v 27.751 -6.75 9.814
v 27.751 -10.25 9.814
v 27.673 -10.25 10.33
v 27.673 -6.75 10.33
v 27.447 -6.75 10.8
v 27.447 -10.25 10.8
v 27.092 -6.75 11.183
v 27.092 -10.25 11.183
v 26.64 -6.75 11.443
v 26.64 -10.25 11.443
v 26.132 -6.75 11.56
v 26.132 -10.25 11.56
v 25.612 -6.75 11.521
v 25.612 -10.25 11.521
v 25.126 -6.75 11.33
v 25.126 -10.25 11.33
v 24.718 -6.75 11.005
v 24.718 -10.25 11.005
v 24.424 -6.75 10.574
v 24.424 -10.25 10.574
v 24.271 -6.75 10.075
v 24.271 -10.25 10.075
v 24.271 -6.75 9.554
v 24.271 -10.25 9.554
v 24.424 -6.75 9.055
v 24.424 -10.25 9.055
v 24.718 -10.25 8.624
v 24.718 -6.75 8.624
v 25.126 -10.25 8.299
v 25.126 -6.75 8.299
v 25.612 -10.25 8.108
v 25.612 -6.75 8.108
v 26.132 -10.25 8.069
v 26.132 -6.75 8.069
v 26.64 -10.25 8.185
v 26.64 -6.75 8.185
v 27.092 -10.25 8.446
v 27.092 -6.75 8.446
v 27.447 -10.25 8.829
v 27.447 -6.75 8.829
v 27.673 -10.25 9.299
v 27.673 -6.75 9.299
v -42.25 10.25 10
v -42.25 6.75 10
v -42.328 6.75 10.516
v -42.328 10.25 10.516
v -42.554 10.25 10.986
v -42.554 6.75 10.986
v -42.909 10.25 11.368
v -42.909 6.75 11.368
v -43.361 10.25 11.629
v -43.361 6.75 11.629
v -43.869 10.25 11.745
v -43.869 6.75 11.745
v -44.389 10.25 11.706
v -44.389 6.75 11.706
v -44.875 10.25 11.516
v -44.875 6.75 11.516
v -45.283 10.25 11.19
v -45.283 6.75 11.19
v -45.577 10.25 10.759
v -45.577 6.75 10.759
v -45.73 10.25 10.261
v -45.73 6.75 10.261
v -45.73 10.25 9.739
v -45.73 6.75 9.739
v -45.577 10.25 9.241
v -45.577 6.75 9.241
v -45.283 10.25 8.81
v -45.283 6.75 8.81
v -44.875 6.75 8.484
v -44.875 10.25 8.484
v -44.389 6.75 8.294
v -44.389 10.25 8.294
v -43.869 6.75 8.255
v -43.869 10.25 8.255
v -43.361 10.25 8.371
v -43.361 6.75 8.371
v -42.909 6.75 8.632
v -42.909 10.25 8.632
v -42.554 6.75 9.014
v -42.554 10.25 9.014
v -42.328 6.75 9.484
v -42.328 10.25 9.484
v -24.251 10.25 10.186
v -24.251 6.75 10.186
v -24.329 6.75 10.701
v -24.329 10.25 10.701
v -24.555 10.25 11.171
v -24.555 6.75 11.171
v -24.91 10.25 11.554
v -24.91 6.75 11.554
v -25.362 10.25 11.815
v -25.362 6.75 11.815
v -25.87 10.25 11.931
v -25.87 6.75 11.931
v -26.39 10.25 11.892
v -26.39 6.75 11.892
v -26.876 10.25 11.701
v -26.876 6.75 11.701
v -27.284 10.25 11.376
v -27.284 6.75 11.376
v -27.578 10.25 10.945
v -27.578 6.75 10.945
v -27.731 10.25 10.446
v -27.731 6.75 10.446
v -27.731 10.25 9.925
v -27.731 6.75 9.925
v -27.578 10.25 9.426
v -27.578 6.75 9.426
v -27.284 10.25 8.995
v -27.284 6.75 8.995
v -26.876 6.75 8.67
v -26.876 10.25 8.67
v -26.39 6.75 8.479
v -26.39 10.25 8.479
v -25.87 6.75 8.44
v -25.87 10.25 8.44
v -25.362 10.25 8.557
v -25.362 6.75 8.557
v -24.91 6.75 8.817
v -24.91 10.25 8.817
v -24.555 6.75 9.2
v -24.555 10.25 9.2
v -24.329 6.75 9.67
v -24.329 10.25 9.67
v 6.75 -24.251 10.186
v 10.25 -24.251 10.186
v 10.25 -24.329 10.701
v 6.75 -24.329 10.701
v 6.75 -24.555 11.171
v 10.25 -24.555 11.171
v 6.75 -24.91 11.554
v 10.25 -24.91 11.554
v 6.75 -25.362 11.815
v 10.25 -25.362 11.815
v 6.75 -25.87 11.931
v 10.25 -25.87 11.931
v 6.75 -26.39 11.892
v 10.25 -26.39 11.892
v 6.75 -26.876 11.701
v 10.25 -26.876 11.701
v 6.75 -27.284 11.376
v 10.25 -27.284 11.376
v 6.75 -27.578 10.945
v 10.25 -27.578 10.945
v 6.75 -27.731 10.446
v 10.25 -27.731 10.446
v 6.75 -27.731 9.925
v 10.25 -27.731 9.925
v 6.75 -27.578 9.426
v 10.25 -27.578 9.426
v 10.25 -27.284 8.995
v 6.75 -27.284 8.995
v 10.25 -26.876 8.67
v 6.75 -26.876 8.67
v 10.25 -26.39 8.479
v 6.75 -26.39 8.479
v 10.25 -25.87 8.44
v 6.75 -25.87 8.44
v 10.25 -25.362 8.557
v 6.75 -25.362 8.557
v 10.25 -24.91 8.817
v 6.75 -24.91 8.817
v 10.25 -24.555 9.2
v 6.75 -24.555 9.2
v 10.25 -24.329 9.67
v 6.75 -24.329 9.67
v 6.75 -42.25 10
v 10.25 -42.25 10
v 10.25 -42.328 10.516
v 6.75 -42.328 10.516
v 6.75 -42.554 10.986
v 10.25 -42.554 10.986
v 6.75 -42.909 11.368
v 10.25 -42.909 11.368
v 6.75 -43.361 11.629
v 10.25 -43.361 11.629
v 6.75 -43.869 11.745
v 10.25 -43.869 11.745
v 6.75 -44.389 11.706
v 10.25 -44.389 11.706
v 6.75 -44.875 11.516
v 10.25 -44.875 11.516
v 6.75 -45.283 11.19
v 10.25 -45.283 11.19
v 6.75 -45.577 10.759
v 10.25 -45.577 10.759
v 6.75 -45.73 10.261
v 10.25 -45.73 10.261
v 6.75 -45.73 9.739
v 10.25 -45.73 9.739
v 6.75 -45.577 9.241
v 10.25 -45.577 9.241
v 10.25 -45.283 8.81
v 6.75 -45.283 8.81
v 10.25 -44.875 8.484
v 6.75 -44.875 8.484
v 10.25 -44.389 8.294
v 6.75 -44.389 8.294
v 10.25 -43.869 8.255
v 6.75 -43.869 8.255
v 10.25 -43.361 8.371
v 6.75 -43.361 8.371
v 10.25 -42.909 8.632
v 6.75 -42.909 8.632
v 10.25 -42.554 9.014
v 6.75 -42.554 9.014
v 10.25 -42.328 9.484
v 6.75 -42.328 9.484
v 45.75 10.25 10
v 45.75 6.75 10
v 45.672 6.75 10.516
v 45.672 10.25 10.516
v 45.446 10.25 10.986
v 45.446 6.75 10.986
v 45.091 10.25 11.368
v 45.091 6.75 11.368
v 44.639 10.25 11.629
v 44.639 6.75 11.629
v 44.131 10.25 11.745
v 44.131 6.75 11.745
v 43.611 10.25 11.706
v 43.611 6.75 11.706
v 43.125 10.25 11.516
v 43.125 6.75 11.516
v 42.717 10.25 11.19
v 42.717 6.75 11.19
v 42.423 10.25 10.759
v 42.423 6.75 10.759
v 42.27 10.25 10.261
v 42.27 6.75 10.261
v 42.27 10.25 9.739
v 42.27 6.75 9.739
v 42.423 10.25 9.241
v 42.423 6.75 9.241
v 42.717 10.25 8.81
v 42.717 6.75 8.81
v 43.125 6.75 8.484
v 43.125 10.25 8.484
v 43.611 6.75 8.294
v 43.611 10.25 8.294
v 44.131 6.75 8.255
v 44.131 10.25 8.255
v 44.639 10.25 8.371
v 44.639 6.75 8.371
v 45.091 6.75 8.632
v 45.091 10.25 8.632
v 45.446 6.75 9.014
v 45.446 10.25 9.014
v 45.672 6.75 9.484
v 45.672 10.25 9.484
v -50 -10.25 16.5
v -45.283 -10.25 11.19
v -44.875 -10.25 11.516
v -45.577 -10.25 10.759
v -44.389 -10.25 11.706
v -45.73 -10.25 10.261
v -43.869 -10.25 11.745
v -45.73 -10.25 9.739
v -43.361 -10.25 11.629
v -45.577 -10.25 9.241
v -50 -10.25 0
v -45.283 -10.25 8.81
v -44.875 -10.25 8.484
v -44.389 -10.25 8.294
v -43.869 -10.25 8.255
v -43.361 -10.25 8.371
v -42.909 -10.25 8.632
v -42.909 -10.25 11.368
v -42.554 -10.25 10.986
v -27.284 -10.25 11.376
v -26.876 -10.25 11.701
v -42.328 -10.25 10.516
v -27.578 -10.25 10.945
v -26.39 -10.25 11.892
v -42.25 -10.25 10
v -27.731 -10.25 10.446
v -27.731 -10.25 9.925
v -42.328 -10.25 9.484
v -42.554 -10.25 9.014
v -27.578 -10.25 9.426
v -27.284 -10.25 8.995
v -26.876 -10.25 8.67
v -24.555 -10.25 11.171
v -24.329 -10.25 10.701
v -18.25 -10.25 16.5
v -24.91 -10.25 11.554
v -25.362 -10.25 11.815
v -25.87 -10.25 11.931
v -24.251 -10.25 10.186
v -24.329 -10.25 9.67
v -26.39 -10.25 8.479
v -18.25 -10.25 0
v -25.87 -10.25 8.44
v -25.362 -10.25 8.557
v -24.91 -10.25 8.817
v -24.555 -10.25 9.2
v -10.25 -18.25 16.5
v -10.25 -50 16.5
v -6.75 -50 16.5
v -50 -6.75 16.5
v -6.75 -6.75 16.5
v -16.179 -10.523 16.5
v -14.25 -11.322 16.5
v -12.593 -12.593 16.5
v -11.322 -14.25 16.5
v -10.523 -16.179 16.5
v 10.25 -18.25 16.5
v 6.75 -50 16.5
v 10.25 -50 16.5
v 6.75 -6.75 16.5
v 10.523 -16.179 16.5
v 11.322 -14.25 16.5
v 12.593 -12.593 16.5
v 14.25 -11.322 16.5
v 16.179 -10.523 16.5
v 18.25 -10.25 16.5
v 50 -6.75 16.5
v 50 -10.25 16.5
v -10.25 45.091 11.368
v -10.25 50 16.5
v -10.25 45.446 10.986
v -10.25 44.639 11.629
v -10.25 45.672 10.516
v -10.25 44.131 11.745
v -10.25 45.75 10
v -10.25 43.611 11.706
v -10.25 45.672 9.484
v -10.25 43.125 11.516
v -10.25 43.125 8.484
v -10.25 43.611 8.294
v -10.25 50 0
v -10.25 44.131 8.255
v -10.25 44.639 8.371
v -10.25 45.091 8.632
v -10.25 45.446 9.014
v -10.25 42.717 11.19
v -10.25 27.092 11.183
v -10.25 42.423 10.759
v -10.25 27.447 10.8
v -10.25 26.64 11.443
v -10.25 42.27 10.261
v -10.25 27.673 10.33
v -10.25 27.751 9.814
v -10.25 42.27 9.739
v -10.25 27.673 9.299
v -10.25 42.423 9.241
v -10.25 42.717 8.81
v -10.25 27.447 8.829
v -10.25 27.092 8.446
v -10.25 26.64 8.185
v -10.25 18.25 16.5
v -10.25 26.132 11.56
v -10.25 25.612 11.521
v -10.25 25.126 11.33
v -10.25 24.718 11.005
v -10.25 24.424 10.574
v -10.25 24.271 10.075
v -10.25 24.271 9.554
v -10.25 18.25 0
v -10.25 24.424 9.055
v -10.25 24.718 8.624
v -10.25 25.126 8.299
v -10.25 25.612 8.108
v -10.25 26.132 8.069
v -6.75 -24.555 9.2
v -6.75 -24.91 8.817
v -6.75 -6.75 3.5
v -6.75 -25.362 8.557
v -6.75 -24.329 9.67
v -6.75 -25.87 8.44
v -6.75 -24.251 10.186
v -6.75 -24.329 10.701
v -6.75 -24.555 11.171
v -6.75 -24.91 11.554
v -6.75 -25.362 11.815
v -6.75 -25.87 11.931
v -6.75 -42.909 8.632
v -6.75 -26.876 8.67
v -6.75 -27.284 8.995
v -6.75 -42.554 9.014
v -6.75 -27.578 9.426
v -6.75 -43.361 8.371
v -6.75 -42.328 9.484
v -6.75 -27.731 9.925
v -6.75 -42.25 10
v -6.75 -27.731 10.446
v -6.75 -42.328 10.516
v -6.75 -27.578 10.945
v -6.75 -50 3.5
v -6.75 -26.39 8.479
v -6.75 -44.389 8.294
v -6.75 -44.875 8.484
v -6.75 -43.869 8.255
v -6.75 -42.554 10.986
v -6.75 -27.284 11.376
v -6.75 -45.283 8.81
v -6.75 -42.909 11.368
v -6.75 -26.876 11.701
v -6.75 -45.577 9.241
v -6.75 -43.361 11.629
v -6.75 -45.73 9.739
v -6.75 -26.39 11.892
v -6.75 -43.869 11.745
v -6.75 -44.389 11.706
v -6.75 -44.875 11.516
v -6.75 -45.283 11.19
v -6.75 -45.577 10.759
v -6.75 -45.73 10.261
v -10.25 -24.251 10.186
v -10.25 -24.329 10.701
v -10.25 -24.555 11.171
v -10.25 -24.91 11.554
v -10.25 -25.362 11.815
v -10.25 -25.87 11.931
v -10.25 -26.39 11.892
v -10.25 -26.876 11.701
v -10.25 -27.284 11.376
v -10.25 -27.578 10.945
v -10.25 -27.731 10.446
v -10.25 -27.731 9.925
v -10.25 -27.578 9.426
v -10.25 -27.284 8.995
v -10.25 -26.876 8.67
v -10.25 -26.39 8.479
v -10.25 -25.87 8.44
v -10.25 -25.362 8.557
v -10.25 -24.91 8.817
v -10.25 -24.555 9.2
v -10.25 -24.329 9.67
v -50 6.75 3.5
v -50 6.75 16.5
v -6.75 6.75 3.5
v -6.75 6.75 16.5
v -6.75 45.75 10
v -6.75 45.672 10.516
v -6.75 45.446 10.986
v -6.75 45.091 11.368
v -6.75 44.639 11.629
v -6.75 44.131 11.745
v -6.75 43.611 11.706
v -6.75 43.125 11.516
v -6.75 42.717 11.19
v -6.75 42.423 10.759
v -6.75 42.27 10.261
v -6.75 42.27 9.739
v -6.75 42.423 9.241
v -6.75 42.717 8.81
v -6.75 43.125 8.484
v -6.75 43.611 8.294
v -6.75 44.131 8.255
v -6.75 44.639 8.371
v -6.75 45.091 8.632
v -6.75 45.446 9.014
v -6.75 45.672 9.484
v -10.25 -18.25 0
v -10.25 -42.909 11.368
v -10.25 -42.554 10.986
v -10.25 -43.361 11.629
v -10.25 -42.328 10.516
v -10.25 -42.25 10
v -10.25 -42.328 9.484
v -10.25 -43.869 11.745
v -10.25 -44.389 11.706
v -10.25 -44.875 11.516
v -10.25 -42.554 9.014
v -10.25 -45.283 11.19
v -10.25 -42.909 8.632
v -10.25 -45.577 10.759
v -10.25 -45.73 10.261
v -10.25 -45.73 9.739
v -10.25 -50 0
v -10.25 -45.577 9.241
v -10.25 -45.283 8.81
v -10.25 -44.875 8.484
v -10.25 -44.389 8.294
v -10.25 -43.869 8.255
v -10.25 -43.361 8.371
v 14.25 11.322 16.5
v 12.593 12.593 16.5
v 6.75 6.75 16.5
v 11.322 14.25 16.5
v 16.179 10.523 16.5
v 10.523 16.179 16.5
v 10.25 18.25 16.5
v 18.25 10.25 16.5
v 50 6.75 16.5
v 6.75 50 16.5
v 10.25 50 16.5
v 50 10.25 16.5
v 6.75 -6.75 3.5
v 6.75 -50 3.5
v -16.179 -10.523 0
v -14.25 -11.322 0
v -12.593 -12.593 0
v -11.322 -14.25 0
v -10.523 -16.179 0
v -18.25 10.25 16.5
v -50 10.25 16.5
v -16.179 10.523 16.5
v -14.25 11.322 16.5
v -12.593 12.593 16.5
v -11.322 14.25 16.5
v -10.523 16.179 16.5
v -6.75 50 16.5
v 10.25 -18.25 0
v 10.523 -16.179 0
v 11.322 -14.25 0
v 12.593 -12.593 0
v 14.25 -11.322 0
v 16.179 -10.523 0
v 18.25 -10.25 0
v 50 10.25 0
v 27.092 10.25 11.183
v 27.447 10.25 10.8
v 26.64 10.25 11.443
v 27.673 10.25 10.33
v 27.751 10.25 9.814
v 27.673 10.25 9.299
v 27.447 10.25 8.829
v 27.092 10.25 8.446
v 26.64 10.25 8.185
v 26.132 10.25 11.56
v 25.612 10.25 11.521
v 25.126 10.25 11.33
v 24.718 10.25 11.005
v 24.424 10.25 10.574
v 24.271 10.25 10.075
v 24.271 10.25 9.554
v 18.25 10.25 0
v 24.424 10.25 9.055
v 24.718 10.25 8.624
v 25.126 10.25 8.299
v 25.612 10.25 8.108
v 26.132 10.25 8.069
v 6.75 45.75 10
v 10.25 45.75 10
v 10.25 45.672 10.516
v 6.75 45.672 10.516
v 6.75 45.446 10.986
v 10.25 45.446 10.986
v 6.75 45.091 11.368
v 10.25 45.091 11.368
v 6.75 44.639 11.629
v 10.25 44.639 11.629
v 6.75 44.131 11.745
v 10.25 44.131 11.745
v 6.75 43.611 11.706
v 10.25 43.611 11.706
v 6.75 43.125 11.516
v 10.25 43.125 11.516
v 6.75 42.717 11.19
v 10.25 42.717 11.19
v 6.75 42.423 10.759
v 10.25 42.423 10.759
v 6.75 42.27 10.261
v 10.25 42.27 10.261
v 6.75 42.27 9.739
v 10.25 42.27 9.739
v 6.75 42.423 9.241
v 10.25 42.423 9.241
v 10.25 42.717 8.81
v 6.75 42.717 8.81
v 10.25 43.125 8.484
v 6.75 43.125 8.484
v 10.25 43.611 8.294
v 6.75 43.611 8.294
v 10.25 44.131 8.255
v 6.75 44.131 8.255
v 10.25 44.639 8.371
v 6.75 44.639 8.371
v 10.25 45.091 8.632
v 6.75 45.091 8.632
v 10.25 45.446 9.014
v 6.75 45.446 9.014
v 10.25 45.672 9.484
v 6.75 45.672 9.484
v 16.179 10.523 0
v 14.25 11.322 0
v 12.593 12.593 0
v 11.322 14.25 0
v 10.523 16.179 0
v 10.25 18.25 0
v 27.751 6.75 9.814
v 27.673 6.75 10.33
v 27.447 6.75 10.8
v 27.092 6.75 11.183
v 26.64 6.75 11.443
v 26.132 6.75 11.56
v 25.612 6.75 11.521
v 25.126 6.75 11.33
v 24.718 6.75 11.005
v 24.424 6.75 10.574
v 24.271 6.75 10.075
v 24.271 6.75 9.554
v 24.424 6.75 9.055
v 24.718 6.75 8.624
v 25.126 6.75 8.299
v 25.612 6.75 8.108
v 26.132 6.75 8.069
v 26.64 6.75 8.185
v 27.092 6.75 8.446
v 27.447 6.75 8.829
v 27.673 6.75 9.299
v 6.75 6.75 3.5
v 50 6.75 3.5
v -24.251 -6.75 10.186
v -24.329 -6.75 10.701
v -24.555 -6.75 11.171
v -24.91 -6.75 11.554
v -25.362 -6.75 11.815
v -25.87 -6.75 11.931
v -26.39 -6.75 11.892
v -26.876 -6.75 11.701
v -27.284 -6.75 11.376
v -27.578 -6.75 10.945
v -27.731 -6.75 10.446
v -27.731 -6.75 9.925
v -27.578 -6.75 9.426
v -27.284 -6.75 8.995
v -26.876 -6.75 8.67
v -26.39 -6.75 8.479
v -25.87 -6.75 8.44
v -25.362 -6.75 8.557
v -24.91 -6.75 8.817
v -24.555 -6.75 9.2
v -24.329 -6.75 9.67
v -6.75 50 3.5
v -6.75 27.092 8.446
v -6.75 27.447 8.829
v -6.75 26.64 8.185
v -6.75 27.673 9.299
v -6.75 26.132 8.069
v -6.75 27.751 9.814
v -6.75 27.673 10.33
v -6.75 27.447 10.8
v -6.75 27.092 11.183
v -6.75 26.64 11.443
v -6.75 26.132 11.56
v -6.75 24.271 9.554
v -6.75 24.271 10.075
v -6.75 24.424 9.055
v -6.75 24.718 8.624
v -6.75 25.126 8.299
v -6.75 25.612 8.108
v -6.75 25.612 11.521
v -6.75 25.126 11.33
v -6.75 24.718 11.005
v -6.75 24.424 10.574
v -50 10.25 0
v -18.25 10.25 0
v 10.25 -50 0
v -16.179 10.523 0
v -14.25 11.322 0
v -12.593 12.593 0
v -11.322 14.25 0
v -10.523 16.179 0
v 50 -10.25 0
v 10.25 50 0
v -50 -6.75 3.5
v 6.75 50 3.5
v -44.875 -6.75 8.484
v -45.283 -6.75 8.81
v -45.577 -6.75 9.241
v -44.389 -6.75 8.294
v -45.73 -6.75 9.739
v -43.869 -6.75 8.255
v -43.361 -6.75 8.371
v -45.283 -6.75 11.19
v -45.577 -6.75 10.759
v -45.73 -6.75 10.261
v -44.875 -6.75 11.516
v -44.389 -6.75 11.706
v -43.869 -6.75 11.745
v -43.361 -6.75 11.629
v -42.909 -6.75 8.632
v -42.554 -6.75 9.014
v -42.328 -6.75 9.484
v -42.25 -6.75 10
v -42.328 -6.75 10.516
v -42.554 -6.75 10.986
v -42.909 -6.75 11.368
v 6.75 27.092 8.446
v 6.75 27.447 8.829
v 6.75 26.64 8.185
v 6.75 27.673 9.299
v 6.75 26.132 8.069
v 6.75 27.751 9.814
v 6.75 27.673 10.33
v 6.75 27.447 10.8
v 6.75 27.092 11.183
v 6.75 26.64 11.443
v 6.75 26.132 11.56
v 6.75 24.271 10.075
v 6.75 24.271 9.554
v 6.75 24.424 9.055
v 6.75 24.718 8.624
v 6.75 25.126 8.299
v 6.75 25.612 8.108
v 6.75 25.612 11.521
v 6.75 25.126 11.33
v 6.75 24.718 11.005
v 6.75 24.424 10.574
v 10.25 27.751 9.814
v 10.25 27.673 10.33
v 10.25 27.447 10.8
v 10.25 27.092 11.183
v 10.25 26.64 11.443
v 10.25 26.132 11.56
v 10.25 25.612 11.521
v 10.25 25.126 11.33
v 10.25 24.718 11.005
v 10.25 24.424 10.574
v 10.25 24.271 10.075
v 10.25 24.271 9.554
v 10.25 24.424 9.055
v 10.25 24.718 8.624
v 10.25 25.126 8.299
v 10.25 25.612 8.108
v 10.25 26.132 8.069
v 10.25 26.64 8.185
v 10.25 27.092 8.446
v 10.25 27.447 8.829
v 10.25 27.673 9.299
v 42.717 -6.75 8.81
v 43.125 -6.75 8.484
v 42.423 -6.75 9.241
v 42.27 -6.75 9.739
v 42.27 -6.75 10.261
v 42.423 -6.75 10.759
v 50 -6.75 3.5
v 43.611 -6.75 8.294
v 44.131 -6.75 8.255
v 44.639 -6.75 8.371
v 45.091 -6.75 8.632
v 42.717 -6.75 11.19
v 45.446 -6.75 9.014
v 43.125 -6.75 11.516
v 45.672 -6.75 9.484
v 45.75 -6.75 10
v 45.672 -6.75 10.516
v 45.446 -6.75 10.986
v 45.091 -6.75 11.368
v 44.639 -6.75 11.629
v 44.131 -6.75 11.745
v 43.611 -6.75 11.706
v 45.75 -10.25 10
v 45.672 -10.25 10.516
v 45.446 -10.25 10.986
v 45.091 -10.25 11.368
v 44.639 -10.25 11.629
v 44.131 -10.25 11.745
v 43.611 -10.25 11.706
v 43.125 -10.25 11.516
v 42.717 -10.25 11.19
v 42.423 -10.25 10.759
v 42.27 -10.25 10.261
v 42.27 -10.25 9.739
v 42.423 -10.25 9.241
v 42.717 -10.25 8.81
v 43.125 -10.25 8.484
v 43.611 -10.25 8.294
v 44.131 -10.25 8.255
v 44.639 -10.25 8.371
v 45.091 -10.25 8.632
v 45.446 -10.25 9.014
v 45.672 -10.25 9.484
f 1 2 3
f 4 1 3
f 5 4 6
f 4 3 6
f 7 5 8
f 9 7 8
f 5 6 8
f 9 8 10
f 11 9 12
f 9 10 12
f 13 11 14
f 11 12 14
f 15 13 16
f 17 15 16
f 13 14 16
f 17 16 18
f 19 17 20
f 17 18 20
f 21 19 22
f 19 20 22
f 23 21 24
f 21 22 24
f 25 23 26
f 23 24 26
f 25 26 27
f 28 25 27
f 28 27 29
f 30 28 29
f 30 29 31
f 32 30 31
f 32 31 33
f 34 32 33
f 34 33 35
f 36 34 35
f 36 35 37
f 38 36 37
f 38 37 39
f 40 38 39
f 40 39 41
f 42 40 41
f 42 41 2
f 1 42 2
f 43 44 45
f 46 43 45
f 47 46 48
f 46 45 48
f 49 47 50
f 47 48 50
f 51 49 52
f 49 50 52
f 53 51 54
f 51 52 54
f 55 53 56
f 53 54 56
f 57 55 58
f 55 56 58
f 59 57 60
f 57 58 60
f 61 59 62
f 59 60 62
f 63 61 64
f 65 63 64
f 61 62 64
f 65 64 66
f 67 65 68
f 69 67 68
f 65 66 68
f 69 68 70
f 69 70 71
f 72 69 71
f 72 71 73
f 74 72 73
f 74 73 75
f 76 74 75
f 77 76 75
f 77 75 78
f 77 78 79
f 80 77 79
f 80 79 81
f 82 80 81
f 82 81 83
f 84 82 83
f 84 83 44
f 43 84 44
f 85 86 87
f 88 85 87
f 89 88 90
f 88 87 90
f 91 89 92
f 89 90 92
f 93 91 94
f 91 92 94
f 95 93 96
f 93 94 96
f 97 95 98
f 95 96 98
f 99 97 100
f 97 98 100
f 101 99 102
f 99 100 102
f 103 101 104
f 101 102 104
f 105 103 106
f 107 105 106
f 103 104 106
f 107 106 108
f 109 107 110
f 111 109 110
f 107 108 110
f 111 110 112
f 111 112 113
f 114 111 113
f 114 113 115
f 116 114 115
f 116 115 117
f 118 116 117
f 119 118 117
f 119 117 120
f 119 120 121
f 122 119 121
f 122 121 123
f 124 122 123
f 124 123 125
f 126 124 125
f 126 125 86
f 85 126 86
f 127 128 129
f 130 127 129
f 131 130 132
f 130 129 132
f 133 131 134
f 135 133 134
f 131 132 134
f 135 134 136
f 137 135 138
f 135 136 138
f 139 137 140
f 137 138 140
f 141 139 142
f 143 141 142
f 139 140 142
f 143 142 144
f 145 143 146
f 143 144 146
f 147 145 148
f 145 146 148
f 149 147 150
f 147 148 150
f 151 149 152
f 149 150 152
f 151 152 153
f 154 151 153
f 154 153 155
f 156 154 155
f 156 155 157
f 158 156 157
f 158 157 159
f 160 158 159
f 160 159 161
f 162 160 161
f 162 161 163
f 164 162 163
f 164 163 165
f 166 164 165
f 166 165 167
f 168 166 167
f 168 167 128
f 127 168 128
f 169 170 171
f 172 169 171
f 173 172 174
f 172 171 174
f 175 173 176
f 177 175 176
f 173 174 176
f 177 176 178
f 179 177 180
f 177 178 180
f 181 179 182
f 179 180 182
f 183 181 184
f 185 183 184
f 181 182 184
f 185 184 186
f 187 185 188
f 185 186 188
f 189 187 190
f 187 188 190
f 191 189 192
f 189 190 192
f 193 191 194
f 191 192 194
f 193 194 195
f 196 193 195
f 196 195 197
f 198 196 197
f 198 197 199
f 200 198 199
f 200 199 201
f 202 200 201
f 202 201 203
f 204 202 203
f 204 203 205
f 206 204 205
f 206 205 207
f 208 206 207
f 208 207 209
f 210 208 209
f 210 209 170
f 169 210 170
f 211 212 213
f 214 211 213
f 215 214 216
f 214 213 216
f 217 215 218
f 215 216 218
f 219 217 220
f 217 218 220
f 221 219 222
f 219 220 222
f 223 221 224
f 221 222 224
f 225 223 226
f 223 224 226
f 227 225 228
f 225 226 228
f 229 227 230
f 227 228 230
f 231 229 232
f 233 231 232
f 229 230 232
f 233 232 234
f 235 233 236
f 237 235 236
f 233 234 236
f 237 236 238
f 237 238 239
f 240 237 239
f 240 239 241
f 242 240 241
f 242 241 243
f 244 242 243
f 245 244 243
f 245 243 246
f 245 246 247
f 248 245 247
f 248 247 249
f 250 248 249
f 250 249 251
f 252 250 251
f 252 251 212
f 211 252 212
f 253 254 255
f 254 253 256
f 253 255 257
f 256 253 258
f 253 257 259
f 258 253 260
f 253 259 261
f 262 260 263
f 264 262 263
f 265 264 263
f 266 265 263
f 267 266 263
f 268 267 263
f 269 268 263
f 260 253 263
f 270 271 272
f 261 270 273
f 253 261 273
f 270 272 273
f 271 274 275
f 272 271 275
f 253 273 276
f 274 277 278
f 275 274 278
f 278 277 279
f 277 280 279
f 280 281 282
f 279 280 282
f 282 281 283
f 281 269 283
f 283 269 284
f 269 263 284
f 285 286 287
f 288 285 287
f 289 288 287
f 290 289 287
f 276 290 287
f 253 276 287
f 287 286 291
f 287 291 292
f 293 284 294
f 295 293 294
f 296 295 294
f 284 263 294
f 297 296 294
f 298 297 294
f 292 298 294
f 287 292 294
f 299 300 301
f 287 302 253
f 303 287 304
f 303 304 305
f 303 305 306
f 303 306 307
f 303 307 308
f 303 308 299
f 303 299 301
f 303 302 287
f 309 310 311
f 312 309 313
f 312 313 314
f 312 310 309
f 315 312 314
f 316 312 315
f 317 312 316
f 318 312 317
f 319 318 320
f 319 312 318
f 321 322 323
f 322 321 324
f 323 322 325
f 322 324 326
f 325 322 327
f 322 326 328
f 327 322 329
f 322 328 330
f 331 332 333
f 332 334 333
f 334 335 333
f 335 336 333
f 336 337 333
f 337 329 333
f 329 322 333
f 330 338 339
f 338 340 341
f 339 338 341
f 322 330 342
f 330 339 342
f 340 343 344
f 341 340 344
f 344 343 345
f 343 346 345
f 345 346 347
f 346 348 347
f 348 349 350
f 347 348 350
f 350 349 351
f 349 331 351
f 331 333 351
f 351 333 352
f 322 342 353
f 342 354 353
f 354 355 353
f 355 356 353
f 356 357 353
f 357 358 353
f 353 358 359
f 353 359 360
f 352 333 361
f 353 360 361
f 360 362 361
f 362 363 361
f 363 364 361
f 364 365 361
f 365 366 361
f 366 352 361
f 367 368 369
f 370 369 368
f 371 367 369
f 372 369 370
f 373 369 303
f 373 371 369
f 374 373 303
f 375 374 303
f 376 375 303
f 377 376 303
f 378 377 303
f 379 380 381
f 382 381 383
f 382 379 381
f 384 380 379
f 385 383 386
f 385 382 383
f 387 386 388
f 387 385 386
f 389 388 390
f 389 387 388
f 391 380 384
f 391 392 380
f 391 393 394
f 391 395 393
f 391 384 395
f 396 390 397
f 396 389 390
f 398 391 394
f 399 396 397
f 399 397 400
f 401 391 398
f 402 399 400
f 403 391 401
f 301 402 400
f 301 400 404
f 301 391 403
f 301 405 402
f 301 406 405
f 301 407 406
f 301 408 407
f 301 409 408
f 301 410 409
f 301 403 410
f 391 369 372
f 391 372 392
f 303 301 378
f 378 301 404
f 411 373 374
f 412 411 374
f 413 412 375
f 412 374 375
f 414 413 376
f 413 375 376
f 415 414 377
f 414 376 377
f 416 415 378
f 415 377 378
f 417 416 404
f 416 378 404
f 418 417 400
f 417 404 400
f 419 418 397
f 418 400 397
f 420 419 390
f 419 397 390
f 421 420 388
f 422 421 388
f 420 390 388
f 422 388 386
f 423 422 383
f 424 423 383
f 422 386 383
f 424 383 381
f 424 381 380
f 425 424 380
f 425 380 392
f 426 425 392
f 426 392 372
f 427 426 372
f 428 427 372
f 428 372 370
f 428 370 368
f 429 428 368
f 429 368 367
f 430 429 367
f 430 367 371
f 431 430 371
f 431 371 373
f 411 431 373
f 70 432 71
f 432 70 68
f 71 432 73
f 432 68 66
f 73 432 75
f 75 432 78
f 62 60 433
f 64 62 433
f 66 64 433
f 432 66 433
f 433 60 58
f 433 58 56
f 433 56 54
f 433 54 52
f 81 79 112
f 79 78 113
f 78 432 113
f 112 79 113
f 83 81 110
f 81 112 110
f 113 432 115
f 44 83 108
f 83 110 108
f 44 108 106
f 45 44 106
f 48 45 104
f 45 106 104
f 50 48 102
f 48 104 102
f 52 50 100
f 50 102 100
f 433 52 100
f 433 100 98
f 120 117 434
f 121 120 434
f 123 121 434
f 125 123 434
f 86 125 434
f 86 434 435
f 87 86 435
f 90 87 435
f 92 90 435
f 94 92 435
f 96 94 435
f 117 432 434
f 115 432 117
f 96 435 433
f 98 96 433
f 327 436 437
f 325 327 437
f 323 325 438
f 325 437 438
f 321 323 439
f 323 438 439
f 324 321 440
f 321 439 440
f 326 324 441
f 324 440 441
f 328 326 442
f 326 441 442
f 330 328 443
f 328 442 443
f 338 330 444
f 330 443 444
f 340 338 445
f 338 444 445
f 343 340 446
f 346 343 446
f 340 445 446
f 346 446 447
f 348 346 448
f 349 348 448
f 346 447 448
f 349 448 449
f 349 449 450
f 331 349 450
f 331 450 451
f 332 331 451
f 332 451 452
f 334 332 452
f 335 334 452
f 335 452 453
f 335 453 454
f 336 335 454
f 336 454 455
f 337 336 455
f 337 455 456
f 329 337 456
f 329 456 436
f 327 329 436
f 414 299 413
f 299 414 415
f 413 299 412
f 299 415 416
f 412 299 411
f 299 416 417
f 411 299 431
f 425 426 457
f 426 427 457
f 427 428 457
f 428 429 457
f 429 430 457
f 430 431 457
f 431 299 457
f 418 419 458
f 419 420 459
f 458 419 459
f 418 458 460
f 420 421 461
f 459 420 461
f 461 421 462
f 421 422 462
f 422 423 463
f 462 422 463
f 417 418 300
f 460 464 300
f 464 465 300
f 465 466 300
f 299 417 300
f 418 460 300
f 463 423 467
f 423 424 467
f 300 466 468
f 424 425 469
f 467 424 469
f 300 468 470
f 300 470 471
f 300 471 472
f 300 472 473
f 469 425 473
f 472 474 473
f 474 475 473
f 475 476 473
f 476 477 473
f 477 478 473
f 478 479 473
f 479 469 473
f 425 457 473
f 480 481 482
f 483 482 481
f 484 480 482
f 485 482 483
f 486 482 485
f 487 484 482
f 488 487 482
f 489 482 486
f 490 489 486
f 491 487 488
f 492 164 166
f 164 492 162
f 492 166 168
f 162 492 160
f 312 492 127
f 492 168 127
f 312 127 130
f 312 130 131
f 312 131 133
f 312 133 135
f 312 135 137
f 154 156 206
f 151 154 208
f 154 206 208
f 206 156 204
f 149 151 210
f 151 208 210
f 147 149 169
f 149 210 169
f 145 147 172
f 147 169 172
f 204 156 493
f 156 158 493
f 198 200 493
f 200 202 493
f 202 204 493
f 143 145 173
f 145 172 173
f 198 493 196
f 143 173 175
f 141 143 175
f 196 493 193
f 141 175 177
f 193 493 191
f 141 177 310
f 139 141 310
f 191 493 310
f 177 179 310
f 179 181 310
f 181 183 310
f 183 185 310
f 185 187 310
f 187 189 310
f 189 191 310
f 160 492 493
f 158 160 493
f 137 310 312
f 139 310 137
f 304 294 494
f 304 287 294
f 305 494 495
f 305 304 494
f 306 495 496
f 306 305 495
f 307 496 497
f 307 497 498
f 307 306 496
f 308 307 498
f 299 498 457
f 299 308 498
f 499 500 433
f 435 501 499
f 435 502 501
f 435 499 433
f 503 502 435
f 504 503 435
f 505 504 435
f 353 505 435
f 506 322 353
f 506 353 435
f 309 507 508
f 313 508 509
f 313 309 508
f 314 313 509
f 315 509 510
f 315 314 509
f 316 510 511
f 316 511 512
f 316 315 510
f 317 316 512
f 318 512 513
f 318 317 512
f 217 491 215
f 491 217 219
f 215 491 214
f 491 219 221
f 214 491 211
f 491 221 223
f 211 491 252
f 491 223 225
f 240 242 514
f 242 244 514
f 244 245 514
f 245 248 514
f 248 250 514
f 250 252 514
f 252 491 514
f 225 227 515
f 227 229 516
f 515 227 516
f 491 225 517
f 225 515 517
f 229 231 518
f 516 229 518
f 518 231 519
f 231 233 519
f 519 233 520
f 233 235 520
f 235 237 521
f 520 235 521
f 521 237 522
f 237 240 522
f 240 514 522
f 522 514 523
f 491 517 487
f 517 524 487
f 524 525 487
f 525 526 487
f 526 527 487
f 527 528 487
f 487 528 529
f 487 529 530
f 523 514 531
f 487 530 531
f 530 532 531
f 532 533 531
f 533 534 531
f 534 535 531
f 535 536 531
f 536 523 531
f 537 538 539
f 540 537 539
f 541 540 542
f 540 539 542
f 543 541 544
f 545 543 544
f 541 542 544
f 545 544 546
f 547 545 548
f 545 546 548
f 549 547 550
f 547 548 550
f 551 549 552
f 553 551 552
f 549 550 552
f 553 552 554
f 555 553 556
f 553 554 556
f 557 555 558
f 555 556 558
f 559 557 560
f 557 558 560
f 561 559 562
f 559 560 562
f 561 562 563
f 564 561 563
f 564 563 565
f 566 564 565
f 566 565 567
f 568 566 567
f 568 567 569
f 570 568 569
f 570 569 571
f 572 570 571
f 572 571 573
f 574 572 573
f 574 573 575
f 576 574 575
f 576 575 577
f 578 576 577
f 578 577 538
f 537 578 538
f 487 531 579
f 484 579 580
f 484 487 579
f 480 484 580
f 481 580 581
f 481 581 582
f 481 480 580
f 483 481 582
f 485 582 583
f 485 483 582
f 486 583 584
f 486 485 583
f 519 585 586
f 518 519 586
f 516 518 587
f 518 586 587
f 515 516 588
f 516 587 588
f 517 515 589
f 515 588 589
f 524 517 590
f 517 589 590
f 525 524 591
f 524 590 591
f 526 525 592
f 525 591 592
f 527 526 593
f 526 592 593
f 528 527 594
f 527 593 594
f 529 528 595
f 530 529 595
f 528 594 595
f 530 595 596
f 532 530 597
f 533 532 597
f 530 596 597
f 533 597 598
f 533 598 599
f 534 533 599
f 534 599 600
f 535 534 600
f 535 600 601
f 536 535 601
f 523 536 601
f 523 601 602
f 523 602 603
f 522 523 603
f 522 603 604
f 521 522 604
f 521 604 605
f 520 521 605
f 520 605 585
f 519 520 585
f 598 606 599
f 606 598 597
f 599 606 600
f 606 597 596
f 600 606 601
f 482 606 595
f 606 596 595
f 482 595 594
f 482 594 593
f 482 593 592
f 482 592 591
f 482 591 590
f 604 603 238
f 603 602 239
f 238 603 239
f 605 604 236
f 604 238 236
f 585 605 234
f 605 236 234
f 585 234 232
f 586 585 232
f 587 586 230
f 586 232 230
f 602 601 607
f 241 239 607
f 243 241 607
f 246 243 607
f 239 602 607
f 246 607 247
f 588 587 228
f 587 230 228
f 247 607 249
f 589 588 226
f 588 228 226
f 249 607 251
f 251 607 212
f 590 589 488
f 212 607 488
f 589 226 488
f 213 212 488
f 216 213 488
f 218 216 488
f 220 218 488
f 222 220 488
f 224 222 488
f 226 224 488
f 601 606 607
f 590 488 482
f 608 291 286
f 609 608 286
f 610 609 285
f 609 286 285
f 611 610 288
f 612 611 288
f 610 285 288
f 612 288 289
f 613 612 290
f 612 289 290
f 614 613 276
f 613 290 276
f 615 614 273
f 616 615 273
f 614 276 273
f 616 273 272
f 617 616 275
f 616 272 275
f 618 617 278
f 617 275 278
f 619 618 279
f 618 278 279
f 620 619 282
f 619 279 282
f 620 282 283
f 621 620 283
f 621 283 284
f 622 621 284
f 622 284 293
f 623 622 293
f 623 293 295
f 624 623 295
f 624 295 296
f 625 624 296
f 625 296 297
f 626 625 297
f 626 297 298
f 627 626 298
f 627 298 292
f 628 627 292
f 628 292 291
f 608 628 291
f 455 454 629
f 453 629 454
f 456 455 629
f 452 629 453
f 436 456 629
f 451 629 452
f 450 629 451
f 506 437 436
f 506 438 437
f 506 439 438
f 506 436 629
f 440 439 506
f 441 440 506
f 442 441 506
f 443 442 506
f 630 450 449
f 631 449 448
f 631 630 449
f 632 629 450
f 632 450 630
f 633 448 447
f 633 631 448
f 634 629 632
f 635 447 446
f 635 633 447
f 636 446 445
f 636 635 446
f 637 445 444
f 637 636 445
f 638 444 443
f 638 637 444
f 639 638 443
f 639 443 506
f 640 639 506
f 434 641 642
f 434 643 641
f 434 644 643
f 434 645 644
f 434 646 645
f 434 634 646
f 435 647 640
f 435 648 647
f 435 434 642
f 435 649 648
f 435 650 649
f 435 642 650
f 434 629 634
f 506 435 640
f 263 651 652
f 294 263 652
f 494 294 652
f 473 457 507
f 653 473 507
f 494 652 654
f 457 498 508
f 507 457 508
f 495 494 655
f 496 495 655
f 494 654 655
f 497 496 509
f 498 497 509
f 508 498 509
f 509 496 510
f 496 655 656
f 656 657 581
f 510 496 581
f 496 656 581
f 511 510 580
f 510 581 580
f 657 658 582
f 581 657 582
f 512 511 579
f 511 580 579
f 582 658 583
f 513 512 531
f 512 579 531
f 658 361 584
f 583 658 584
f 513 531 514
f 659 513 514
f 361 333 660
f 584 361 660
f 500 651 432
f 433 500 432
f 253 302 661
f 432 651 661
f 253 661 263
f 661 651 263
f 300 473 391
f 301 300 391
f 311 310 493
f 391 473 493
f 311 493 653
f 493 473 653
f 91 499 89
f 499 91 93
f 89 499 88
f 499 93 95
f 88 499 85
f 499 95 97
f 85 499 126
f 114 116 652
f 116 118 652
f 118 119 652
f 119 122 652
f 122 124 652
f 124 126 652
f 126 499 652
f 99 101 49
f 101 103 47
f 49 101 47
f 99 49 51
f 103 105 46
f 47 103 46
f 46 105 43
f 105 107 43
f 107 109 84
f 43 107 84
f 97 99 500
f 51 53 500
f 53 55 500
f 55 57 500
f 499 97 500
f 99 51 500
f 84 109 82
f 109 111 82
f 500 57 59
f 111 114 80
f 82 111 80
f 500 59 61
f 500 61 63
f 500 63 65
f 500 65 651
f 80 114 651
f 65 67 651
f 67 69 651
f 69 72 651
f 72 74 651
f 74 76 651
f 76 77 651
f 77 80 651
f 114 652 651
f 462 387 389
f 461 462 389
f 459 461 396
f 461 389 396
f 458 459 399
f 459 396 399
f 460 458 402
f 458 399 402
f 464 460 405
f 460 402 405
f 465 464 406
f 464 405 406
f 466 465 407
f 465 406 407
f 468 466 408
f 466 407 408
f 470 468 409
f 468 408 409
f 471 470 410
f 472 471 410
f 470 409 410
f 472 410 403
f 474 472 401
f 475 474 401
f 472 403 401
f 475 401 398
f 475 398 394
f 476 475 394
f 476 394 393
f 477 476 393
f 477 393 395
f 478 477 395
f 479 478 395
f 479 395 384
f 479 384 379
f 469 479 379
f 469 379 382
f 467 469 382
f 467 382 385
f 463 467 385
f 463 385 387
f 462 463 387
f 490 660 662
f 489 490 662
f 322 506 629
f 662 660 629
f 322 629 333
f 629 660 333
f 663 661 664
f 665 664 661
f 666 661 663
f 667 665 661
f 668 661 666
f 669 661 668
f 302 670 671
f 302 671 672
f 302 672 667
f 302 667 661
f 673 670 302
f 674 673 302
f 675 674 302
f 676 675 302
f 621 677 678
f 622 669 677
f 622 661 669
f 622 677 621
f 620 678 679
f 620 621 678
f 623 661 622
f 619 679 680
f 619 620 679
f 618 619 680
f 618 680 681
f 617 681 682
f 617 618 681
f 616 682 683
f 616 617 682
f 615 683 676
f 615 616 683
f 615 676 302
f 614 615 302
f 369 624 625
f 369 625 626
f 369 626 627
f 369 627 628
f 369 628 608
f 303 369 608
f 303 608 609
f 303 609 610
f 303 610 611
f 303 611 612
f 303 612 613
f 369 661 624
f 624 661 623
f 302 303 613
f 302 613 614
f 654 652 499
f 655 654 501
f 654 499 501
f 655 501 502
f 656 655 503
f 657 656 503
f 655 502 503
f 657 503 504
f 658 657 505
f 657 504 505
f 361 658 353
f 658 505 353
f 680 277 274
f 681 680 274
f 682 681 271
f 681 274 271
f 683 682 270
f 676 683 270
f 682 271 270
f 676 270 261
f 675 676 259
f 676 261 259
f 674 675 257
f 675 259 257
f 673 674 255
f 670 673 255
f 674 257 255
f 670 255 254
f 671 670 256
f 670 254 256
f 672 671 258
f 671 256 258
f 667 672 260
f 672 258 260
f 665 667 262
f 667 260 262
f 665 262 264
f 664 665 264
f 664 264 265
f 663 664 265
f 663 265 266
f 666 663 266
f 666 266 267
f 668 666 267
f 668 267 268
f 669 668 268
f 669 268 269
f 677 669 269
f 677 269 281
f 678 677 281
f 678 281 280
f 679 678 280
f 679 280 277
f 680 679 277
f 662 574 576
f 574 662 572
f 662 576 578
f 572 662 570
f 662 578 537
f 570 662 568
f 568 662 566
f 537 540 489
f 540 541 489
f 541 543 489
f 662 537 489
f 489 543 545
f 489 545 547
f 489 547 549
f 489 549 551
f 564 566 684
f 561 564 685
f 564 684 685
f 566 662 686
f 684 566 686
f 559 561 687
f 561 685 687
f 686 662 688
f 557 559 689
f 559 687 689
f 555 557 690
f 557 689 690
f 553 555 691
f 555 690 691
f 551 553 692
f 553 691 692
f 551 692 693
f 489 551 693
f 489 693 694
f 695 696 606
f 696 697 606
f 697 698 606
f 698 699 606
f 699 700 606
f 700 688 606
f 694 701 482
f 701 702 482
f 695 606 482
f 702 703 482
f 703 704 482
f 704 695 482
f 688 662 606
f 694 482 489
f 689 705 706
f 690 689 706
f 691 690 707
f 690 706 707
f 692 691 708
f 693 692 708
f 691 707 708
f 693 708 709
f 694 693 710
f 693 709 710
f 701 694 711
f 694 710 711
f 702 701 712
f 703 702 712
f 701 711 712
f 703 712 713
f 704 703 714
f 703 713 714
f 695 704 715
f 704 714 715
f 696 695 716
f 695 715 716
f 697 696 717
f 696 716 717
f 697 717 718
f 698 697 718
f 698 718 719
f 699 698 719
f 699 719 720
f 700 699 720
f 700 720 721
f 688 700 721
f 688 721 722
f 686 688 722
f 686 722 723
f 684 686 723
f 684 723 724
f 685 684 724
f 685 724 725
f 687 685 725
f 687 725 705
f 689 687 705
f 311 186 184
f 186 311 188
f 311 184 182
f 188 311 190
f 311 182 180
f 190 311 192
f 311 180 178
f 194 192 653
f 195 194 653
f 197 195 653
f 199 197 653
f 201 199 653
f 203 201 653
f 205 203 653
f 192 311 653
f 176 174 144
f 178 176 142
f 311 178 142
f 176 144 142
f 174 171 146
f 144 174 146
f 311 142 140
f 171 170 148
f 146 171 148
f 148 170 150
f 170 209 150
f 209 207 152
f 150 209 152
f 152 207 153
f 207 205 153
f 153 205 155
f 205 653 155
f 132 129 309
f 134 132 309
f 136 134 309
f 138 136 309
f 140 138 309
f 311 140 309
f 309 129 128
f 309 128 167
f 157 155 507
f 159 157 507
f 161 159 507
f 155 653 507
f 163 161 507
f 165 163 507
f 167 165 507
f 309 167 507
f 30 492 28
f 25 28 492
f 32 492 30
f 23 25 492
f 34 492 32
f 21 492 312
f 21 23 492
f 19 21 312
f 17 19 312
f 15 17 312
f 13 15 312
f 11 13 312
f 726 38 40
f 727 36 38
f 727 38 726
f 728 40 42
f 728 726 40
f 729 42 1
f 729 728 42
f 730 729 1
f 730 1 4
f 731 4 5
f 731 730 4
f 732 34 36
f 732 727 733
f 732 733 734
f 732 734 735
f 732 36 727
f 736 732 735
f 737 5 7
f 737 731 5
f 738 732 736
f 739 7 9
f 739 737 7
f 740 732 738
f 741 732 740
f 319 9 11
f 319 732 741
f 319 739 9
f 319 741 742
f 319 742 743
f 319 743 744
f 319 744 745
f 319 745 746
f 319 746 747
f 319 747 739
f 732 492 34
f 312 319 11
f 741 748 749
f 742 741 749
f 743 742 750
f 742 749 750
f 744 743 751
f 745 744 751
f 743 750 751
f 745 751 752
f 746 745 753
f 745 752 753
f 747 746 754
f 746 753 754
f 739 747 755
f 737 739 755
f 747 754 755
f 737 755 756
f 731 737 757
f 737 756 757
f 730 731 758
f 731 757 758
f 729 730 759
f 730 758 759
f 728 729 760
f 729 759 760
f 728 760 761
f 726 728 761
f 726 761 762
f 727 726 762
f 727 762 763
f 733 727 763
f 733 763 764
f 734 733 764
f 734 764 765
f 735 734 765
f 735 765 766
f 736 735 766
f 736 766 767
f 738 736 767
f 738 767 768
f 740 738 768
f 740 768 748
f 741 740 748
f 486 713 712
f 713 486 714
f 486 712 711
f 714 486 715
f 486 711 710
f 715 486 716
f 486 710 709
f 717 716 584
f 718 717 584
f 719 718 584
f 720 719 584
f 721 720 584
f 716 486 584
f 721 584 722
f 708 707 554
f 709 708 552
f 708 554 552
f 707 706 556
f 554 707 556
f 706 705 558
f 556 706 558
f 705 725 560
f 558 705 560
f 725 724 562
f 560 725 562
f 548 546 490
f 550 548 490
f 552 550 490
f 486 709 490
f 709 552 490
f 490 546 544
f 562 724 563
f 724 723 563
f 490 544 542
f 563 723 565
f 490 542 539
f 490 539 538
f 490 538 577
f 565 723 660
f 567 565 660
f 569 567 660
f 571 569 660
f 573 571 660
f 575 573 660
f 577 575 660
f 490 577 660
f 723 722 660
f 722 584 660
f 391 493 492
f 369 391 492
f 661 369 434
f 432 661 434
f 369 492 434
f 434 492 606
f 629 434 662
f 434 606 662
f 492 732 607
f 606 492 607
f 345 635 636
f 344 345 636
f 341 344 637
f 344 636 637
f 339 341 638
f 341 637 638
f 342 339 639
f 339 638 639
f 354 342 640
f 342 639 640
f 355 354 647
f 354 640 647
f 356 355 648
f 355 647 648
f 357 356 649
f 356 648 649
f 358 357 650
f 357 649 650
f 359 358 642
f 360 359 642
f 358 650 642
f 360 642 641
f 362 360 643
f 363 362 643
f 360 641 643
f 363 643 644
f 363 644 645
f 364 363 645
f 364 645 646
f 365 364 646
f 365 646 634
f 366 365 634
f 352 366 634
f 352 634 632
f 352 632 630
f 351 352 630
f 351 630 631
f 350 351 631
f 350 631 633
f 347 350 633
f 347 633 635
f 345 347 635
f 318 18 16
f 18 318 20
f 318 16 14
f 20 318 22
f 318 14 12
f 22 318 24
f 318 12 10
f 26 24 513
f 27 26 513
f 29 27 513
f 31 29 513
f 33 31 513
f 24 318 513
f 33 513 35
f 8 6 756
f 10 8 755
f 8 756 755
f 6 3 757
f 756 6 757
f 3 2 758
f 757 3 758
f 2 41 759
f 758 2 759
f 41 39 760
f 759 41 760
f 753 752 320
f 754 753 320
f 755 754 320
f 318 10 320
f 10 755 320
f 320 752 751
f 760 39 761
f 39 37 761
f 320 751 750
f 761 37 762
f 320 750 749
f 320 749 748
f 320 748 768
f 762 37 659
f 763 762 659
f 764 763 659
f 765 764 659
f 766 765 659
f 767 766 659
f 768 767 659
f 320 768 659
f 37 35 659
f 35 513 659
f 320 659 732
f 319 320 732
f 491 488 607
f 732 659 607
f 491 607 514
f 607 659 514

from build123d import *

# Parameters (mm, degrees)
F1_DEPTH = 16.5
F2_W     = 13.5
F2_H     = 13
F3_DEPTH = 100.001
F4_W     = 13.5
F4_H     = 13
F5_DEPTH = 100.001
F6_R     = 1.75
F7_DEPTH = 60.251
F8_R     = 1.75
F9_DEPTH = 60.251
F10_R    = 8


with BuildPart() as f1:
    # F0 (on Top) → F1 (new body)
    with BuildSketch(Plane.XY):
        Polygon((-10.25, 10.25), (-50, 10.25), (-50, -10.25), (-10.25, -10.25), (-10.25, -50), (10.25, -50), (10.25, -10.25), (50, -10.25), (50, 10.25), (10.25, 10.25), (10.25, 50), (-10.25, 50), align=None)
    extrude(amount=F1_DEPTH)

    # F2 (on face) → F3 (cut, through all)
    with BuildSketch(Plane.YZ.offset(50)):
        with Locations((0, 10)):
            Rectangle(F2_W, F2_H)
    extrude(amount=-F3_DEPTH, mode=Mode.SUBTRACT)

    # F4 (on face) → F5 (cut, through all)
    with BuildSketch(Plane.XZ.offset(50)):
        with Locations((0, 10)):
            Rectangle(F4_W, F4_H)
    extrude(amount=-F5_DEPTH, mode=Mode.SUBTRACT)

    # F6 (on face) → F7 (cut, through all)
    with BuildSketch(Plane.YZ.offset(10.25)):
        with Locations((44, 10)):
            Circle(F6_R)
        with Locations((26.000956, 9.814443)):
            Circle(F6_R)
        with Locations((-26.000956, 10.185557)):
            Circle(F6_R)
        with Locations((-44, 10)):
            Circle(F6_R)
    extrude(amount=-F7_DEPTH, mode=Mode.SUBTRACT)

    # F8 (on face) → F9 (cut, through all)
    with BuildSketch(Plane.XZ.offset(10.25)):
        with Locations((44, 10)):
            Circle(F8_R)
        with Locations((26.000956, 9.814443)):
            Circle(F8_R)
        with Locations((-26.000956, 10.185557)):
            Circle(F8_R)
        with Locations((-44, 10)):
            Circle(F8_R)
    extrude(amount=-F9_DEPTH, mode=Mode.SUBTRACT)

    # F10
    f10_edges = [f1.edges().sort_by_distance(p)[0] for p in [
        (10.25, -10.25, 8.25),
        (10.25, 10.25, 8.25),
        (-10.25, 10.25, 8.25),
        (-10.25, -10.25, 8.25),
    ]]
    fillet(f10_edges, radius=F10_R)


solid = f1.part
